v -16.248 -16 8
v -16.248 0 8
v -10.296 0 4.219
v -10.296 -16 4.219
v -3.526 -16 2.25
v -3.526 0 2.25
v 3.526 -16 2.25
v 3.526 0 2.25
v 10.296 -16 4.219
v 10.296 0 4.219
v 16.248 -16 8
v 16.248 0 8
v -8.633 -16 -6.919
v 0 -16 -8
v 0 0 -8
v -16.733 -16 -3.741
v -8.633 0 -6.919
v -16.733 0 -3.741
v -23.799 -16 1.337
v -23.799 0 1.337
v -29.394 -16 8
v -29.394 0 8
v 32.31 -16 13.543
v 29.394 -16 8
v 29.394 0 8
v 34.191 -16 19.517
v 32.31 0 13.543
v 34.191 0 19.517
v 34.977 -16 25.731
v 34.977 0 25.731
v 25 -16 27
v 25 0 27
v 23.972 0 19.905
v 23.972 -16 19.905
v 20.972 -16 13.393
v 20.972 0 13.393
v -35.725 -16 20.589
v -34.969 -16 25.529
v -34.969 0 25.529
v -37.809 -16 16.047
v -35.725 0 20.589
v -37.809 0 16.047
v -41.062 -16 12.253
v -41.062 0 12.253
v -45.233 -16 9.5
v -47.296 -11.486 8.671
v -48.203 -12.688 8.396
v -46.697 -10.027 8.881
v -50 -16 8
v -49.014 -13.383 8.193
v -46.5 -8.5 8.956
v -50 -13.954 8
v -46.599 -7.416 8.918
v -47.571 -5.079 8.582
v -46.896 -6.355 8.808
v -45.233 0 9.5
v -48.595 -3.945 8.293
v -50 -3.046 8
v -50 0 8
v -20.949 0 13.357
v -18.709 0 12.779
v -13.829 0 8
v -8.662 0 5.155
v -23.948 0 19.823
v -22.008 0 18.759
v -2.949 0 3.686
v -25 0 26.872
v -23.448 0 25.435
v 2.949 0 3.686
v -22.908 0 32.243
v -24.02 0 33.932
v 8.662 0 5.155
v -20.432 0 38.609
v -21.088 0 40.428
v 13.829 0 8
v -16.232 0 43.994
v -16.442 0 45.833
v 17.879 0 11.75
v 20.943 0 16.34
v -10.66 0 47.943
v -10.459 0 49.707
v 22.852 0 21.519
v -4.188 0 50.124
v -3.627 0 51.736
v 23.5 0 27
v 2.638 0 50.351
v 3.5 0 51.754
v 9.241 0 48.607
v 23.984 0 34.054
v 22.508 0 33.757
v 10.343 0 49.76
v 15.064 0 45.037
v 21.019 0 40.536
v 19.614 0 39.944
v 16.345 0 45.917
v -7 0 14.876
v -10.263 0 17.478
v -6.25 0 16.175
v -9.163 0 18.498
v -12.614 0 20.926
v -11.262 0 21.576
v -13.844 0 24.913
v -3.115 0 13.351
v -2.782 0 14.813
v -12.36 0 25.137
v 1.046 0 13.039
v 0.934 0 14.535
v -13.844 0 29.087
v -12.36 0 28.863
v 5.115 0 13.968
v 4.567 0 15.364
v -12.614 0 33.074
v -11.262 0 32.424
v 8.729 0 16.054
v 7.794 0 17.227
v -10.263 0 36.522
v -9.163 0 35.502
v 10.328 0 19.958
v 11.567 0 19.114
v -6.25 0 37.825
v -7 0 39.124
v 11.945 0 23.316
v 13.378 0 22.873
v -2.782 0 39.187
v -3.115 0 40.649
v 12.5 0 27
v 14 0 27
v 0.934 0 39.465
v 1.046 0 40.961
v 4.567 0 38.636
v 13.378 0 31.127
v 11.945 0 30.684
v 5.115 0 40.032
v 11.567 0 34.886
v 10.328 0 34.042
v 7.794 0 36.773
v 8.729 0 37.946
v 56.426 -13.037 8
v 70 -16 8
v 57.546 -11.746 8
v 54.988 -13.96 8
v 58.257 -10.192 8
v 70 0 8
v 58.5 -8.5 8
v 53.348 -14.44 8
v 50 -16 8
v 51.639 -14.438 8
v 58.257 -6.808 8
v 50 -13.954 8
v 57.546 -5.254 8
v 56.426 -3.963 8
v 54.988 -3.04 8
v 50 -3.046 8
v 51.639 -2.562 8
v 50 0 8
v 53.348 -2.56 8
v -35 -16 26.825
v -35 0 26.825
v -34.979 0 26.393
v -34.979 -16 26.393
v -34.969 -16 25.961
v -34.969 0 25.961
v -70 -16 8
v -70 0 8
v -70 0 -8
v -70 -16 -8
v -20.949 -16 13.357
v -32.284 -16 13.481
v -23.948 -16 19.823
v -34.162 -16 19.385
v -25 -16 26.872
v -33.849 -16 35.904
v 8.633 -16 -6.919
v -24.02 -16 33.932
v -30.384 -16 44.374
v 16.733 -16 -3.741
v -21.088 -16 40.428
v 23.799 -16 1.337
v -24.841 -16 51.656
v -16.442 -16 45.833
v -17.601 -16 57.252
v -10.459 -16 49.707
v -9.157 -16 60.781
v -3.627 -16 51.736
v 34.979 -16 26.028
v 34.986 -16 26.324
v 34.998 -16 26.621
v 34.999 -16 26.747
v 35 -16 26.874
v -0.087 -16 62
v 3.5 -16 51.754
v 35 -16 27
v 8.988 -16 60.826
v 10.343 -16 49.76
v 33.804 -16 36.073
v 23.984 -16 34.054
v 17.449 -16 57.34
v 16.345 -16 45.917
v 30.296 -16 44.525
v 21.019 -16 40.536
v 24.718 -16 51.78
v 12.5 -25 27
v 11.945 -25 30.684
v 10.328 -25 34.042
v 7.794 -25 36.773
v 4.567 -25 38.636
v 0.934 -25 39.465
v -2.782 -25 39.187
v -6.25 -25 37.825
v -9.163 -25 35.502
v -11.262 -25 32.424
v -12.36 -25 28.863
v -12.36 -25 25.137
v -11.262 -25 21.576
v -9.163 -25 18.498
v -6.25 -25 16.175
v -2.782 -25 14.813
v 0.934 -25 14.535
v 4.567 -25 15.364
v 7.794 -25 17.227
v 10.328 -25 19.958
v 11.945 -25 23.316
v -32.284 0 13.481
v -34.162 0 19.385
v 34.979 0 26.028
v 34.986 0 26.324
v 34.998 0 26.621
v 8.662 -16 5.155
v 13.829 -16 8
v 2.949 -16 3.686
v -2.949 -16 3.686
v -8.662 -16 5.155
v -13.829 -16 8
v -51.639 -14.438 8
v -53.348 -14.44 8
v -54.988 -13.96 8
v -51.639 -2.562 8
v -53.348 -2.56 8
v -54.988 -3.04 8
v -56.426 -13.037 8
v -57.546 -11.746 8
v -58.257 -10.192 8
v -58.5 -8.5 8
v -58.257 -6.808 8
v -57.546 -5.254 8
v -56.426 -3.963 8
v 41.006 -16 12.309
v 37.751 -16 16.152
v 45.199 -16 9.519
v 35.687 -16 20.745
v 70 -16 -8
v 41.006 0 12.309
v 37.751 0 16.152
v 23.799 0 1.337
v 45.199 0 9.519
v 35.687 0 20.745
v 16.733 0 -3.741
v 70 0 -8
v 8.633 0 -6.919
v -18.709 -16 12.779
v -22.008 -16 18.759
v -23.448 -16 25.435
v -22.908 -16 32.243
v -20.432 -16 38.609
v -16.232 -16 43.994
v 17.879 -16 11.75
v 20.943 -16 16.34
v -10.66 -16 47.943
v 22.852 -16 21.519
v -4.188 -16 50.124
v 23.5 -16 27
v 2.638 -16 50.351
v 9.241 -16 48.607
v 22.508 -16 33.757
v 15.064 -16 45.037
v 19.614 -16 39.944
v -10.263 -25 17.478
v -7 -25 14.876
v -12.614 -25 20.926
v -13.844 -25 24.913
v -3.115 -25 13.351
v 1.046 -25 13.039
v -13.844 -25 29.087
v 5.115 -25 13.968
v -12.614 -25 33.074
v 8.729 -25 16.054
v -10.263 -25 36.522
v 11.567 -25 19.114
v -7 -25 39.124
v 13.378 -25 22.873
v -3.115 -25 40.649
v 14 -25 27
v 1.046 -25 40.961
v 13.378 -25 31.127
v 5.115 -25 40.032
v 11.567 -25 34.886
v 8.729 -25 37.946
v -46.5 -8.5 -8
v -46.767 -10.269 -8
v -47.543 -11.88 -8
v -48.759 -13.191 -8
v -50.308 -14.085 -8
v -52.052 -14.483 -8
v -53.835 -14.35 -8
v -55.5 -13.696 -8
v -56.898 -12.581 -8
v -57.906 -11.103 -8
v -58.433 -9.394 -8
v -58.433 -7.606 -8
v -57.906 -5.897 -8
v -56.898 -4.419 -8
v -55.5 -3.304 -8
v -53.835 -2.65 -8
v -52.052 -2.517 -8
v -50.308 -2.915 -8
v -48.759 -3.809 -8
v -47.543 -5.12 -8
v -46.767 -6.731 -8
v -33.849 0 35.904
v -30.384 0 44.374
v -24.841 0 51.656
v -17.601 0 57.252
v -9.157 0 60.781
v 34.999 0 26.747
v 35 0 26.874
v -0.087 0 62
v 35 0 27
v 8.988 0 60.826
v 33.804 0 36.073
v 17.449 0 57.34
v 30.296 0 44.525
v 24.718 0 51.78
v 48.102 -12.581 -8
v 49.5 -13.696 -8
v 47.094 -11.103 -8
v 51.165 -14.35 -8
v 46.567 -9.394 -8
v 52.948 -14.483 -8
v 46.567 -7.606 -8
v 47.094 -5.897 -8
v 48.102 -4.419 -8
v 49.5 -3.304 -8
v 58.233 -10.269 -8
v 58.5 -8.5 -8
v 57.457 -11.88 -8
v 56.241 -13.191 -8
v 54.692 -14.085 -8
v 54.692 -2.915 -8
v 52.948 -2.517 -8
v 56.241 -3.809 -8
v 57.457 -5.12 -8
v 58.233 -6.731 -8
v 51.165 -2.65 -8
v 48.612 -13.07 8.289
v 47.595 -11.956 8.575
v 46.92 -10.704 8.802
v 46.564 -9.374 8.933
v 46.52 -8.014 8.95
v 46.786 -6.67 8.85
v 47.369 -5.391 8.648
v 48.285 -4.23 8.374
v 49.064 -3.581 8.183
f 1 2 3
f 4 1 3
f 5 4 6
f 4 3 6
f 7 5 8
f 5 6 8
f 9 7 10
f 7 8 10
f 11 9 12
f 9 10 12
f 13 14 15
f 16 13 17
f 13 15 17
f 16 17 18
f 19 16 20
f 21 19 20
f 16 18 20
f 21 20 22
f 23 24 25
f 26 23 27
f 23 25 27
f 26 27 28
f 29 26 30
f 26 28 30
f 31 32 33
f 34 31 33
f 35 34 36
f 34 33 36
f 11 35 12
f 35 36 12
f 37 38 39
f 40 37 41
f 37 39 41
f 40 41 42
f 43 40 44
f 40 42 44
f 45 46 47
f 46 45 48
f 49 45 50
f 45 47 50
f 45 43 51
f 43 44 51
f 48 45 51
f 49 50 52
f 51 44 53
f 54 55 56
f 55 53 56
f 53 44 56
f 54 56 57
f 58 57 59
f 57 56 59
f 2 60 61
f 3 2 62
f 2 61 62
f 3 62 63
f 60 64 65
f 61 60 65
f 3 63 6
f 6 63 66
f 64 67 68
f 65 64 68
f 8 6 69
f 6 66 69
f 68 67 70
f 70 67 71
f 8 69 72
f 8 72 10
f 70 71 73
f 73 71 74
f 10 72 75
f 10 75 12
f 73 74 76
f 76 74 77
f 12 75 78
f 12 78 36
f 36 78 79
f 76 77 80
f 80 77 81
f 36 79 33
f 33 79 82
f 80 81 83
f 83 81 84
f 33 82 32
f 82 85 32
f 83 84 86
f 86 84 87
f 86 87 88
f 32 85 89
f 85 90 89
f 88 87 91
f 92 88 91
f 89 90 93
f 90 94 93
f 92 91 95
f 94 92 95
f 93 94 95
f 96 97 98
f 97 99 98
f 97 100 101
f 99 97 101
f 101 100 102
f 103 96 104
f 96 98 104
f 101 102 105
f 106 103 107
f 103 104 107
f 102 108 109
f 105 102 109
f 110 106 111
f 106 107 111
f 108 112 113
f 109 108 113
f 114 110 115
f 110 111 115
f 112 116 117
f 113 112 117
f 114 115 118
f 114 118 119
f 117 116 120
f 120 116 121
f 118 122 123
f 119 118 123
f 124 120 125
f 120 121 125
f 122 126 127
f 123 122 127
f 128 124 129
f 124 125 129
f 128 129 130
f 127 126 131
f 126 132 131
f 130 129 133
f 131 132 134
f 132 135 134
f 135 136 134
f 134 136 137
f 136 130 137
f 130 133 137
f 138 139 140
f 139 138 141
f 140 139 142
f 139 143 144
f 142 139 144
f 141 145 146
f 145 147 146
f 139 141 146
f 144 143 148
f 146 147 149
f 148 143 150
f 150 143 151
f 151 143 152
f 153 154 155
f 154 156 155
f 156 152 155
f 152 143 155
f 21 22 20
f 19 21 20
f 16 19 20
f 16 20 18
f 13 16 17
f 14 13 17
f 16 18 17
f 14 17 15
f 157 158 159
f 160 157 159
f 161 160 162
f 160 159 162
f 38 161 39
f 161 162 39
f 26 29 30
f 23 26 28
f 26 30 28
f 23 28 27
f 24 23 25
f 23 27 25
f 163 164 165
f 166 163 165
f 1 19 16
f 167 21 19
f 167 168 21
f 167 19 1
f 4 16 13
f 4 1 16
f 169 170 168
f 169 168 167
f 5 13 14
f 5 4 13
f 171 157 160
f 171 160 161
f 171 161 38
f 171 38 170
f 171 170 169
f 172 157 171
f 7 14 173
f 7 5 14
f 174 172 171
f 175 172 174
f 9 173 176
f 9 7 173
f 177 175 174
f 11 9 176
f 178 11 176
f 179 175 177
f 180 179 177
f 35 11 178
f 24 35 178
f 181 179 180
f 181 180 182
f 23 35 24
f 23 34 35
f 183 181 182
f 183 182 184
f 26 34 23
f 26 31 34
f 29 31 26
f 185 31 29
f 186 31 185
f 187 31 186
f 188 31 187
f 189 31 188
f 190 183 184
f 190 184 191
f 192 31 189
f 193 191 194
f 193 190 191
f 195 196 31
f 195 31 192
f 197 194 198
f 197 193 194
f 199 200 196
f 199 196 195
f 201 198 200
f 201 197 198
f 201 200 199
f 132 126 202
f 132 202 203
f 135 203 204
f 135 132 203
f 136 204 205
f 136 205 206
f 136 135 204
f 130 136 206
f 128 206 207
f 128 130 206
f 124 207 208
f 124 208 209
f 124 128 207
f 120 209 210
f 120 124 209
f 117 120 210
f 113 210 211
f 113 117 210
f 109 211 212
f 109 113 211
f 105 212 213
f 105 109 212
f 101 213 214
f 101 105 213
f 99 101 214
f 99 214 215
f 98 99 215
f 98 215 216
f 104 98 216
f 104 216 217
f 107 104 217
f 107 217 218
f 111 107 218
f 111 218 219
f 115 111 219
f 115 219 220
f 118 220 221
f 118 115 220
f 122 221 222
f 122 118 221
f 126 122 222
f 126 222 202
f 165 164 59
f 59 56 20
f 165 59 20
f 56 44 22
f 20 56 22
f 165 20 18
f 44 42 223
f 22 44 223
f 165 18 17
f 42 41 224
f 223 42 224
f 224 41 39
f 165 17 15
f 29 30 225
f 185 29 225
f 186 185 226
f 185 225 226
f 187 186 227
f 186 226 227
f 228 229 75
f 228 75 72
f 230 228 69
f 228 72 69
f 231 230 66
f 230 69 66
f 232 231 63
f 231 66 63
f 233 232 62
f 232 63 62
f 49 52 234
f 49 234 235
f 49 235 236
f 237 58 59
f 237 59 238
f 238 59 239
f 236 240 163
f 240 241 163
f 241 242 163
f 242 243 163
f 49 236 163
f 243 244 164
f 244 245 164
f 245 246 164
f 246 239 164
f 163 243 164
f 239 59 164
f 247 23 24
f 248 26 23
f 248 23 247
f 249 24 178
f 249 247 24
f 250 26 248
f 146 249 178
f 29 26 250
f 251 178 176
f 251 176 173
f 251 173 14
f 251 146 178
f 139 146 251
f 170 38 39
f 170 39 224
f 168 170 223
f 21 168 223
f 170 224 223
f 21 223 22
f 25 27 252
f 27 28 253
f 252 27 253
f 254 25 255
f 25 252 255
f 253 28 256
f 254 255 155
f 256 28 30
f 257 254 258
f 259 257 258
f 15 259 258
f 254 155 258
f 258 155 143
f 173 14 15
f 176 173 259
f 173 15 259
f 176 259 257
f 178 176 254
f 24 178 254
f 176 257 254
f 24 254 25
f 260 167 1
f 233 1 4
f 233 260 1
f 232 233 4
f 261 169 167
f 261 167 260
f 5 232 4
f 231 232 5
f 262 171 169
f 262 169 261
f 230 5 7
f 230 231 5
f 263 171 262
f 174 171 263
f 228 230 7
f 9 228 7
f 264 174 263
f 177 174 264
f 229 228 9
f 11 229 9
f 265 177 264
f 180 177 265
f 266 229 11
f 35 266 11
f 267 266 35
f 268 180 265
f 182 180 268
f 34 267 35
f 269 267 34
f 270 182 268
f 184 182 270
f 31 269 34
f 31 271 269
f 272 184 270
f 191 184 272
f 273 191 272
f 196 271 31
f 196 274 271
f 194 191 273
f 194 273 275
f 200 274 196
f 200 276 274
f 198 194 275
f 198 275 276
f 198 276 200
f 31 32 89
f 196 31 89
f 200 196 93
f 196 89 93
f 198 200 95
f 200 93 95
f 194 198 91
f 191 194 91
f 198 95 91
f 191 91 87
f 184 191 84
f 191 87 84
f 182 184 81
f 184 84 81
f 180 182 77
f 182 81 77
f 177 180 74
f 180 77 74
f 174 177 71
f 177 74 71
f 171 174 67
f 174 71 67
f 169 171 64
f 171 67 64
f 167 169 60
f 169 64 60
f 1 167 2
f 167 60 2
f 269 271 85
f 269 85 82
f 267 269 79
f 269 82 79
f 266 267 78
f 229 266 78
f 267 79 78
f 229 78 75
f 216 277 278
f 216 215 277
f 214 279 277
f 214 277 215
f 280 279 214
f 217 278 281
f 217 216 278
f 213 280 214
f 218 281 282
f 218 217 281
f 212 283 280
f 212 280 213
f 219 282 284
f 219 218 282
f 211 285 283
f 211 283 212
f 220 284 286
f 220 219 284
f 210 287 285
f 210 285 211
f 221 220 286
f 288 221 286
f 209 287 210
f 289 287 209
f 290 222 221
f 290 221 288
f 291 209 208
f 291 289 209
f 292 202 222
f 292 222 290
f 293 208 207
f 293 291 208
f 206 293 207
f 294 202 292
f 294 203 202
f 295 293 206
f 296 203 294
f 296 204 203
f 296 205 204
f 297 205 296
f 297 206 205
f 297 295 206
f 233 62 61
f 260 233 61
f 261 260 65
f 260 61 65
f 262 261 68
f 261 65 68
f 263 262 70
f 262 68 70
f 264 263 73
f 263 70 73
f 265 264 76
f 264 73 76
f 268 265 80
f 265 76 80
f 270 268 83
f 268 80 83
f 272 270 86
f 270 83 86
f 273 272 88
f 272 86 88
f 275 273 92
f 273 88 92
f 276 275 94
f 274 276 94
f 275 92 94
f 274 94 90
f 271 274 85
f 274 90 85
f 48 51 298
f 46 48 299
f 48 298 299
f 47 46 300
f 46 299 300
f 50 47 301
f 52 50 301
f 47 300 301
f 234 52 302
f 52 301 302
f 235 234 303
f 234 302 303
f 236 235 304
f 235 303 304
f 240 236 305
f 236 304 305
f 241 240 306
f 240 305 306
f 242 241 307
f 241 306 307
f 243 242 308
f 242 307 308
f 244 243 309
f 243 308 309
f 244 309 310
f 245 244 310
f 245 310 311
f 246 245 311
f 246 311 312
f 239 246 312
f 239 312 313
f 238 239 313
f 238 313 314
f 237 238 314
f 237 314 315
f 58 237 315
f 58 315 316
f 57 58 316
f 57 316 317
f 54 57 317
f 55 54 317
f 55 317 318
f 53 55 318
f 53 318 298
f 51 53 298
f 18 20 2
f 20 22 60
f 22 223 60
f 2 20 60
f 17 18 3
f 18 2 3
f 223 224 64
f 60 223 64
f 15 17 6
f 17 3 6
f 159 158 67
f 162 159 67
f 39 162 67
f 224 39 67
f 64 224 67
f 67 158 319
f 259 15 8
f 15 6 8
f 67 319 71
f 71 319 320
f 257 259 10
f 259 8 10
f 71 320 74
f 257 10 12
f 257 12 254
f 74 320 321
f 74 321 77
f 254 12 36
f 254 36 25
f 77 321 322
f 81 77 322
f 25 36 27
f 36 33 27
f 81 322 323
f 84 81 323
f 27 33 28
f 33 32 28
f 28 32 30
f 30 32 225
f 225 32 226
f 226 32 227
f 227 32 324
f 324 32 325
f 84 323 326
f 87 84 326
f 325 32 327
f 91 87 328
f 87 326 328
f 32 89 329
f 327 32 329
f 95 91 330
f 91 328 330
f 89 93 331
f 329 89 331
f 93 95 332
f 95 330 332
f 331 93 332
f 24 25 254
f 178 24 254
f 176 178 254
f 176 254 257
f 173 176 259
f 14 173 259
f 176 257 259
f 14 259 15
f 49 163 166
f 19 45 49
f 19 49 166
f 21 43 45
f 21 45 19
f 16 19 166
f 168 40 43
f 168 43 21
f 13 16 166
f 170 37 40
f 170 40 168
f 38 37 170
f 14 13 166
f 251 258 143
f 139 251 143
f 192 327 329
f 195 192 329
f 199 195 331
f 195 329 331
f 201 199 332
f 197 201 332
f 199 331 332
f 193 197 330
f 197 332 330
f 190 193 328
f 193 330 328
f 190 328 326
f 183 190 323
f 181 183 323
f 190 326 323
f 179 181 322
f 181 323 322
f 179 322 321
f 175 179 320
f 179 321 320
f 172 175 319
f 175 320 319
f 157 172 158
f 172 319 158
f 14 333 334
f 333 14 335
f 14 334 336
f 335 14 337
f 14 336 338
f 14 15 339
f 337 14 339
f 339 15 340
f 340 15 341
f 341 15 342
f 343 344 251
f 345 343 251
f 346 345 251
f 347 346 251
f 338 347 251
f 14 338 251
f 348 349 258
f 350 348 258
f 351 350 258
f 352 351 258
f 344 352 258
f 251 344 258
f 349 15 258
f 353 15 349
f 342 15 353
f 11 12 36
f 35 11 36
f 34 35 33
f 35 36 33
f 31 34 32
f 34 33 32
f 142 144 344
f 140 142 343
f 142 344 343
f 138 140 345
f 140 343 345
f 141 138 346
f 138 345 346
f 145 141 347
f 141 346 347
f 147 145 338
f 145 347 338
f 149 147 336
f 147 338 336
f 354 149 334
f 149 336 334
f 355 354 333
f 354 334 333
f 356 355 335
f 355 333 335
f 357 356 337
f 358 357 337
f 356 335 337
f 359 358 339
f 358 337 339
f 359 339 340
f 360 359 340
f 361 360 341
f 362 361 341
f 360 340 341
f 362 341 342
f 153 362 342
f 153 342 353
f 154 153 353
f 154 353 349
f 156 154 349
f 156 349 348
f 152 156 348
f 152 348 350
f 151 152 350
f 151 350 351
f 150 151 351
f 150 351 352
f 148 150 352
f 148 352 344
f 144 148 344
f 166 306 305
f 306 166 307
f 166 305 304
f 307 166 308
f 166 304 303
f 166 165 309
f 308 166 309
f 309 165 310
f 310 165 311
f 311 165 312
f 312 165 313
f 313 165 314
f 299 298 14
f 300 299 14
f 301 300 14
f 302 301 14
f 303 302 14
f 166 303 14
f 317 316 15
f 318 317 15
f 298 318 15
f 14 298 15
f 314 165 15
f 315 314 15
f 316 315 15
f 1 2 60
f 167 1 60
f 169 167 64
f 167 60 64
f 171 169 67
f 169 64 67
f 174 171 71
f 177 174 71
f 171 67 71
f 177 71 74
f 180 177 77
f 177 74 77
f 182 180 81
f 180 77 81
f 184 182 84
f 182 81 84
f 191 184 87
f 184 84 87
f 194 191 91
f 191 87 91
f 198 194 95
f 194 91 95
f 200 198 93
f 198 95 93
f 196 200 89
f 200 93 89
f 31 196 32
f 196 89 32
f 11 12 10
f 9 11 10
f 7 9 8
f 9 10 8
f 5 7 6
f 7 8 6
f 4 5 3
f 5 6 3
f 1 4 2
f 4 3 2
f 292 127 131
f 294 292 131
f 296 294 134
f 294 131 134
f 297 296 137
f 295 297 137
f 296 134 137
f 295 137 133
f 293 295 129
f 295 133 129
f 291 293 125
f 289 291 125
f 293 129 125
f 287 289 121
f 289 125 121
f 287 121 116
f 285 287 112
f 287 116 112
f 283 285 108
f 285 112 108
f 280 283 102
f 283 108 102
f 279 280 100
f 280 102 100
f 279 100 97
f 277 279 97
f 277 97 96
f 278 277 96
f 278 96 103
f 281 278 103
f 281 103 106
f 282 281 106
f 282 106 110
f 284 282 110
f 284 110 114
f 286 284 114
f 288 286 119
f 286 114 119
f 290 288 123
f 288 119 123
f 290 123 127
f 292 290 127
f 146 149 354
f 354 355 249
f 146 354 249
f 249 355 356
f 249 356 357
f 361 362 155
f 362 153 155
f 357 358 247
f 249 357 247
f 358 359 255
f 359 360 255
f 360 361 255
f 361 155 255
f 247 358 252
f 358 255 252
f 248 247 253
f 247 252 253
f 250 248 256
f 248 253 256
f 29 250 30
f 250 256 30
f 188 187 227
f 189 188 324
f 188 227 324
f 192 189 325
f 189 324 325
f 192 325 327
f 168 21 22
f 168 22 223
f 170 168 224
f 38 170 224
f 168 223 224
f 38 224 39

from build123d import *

# Parameters (mm, degrees)
F1_DEPTH = 16
F2_DEPTH = 16
F3_DEPTH = 16
F0_R     = 14
F0_R_2   = 12.5
F4_DEPTH = 25
F5_R     = 6
F6_DEPTH = 70.001


with BuildPart() as f1:
    # F0 (on Front) → F1 (new body)
    with BuildSketch(Plane.XZ):
        with BuildLine():
            ThreePointArc((29.3938769134, 8), (16.7332005307, -3.7408522979), (0, -8))
            Line((0, -8), (70, -8))
            Line((70, -8), (70, 8))
            Line((70, 8), (50, 8))
            Line((50, 8), (29.3938769134, 8))
        make_face()
        with BuildLine():
            ThreePointArc((34.976979378, 25.7307822924), (33.3840822114, 16.4879566733), (29.3938769134, 8))
            Line((29.3938769134, 8), (50, 8))
            ThreePointArc((50, 8), (39.2436746706, 14.1161090146), (34.976979378, 25.7307822924))
        make_face()
    extrude(amount=F1_DEPTH)


with BuildPart() as f1b:
    # F0 (on Front) → F1, piece 2 (new body)
    with BuildSketch(Plane.XZ):
        with BuildLine():
            Line((-70, 8), (-70, -8))
            Line((-70, -8), (0, -8))
            ThreePointArc((0, -8), (-16.7332005307, -3.7408522979), (-29.3938769134, 8))
            Line((-29.3938769134, 8), (-50, 8))
            Line((-50, 8), (-70, 8))
        make_face()
        with BuildLine():
            Line((-50, 8), (-29.3938769134, 8))
            ThreePointArc((-29.3938769134, 8), (-33.3535495136, 16.391478197), (-34.9690553288, 25.5285485367))
            ThreePointArc((-34.9690553288, 25.5285485367), (-39.303522738, 14.0365236535), (-50, 8))
        make_face()
    extrude(amount=F1_DEPTH)


with BuildPart() as f2:
    # F0 (on Front) → F2 (new body)
    with BuildSketch(Plane.XZ):
        with BuildLine():
            ThreePointArc((-29.3938769134, 8), (-16.7332005307, -3.7408522979), (0, -8))
            ThreePointArc((0, -8), (16.7332005307, -3.7408522979), (29.3938769134, 8))
            Line((29.3938769134, 8), (16.2480768093, 8))
            ThreePointArc((16.2480768093, 8), (0, 2), (-16.2480768093, 8))
            Line((-16.2480768093, 8), (-29.3938769134, 8))
        make_face()
        with BuildLine():
            ThreePointArc((-34.9690553288, 25.5285485367), (-33.3535495136, 16.391478197), (-29.3938769134, 8))
            Line((-29.3938769134, 8), (-16.2480768093, 8))
            ThreePointArc((-16.2480768093, 8), (-10.4593995948, 49.7068483087), (25, 27))
            ThreePointArc((25, 27), (22.7068483087, 16.5406004052), (16.2480768093, 8))
            Line((16.2480768093, 8), (29.3938769134, 8))
            ThreePointArc((29.3938769134, 8), (33.3840822114, 16.4879566733), (34.976979378, 25.7307822924))
            ThreePointArc((34.976979378, 25.7307822924), (34.9819582811, 26.1759932133), (34.9979473276, 26.6209447882))
            ThreePointArc((34.9979473276, 26.6209447882), (34.9994868281, 26.8104696152), (35, 27))
            ThreePointArc((35, 27), (-0.0874511362, 61.999890747), (-34.9995629885, 26.8250982735))
            ThreePointArc((-34.9995629885, 26.8250982735), (-34.9726282389, 26.1770982557), (-34.9690553288, 25.5285485367))
        make_face()
    extrude(amount=F2_DEPTH)


with BuildPart() as f3:
    # F0 (on Front) → F3 (new body)
    with BuildSketch(Plane.XZ):
        with BuildLine():
            ThreePointArc((25, 27), (-10.4593995948, 49.7068483087), (-16.2480768093, 8))
            Line((-16.2480768093, 8), (-13.8293166859, 8))
            ThreePointArc((-13.8293166859, 8), (-10.6597621428, 47.9432440434), (23.5, 27))
            ThreePointArc((23.5, 27), (20.9432440434, 16.3402378572), (13.8293166859, 8))
            Line((13.8293166859, 8), (16.2480768093, 8))
            ThreePointArc((16.2480768093, 8), (22.7068483087, 16.5406004052), (25, 27))
        make_face()
        with BuildLine():
            Line((-13.8293166859, 8), (-16.2480768093, 8))
            ThreePointArc((-16.2480768093, 8), (0, 2), (16.2480768093, 8))
            Line((16.2480768093, 8), (13.8293166859, 8))
            ThreePointArc((13.8293166859, 8), (0, 3.5), (-13.8293166859, 8))
        make_face()
    extrude(amount=F3_DEPTH)


with BuildPart() as f4:
    # F0 (on Front) → F4 (new body)
    with BuildSketch(Plane.XZ):
        with Locations((0, 27)):
            Circle(F0_R)
        with Locations((0, 27)):
            Circle(F0_R_2, mode=Mode.SUBTRACT)
    extrude(amount=F4_DEPTH)


with BuildPart() as f6_tool:
    # F5 (on face) → F6 (new body, through all)
    with BuildSketch(Plane(origin=(0, 0, -8), x_dir=(1, 0, 0), z_dir=(0, 0, -1))):
        with Locations((-52.5, 8.5000162944)):
            Circle(F5_R)
        with Locations((52.5, 8.5000162944)):
            Circle(F5_R)
    extrude(amount=-F6_DEPTH)


with BuildPart() as f1_1:
    add(f1.part)

    # F6: cut by f6_tool
    add(f6_tool.part, mode=Mode.SUBTRACT)


with BuildPart() as f1b_1:
    add(f1b.part)

    # F6: cut by f6_tool
    add(f6_tool.part, mode=Mode.SUBTRACT)


solid = Compound([f2.part, f3.part, f4.part, f1_1.part, f1b_1.part])
